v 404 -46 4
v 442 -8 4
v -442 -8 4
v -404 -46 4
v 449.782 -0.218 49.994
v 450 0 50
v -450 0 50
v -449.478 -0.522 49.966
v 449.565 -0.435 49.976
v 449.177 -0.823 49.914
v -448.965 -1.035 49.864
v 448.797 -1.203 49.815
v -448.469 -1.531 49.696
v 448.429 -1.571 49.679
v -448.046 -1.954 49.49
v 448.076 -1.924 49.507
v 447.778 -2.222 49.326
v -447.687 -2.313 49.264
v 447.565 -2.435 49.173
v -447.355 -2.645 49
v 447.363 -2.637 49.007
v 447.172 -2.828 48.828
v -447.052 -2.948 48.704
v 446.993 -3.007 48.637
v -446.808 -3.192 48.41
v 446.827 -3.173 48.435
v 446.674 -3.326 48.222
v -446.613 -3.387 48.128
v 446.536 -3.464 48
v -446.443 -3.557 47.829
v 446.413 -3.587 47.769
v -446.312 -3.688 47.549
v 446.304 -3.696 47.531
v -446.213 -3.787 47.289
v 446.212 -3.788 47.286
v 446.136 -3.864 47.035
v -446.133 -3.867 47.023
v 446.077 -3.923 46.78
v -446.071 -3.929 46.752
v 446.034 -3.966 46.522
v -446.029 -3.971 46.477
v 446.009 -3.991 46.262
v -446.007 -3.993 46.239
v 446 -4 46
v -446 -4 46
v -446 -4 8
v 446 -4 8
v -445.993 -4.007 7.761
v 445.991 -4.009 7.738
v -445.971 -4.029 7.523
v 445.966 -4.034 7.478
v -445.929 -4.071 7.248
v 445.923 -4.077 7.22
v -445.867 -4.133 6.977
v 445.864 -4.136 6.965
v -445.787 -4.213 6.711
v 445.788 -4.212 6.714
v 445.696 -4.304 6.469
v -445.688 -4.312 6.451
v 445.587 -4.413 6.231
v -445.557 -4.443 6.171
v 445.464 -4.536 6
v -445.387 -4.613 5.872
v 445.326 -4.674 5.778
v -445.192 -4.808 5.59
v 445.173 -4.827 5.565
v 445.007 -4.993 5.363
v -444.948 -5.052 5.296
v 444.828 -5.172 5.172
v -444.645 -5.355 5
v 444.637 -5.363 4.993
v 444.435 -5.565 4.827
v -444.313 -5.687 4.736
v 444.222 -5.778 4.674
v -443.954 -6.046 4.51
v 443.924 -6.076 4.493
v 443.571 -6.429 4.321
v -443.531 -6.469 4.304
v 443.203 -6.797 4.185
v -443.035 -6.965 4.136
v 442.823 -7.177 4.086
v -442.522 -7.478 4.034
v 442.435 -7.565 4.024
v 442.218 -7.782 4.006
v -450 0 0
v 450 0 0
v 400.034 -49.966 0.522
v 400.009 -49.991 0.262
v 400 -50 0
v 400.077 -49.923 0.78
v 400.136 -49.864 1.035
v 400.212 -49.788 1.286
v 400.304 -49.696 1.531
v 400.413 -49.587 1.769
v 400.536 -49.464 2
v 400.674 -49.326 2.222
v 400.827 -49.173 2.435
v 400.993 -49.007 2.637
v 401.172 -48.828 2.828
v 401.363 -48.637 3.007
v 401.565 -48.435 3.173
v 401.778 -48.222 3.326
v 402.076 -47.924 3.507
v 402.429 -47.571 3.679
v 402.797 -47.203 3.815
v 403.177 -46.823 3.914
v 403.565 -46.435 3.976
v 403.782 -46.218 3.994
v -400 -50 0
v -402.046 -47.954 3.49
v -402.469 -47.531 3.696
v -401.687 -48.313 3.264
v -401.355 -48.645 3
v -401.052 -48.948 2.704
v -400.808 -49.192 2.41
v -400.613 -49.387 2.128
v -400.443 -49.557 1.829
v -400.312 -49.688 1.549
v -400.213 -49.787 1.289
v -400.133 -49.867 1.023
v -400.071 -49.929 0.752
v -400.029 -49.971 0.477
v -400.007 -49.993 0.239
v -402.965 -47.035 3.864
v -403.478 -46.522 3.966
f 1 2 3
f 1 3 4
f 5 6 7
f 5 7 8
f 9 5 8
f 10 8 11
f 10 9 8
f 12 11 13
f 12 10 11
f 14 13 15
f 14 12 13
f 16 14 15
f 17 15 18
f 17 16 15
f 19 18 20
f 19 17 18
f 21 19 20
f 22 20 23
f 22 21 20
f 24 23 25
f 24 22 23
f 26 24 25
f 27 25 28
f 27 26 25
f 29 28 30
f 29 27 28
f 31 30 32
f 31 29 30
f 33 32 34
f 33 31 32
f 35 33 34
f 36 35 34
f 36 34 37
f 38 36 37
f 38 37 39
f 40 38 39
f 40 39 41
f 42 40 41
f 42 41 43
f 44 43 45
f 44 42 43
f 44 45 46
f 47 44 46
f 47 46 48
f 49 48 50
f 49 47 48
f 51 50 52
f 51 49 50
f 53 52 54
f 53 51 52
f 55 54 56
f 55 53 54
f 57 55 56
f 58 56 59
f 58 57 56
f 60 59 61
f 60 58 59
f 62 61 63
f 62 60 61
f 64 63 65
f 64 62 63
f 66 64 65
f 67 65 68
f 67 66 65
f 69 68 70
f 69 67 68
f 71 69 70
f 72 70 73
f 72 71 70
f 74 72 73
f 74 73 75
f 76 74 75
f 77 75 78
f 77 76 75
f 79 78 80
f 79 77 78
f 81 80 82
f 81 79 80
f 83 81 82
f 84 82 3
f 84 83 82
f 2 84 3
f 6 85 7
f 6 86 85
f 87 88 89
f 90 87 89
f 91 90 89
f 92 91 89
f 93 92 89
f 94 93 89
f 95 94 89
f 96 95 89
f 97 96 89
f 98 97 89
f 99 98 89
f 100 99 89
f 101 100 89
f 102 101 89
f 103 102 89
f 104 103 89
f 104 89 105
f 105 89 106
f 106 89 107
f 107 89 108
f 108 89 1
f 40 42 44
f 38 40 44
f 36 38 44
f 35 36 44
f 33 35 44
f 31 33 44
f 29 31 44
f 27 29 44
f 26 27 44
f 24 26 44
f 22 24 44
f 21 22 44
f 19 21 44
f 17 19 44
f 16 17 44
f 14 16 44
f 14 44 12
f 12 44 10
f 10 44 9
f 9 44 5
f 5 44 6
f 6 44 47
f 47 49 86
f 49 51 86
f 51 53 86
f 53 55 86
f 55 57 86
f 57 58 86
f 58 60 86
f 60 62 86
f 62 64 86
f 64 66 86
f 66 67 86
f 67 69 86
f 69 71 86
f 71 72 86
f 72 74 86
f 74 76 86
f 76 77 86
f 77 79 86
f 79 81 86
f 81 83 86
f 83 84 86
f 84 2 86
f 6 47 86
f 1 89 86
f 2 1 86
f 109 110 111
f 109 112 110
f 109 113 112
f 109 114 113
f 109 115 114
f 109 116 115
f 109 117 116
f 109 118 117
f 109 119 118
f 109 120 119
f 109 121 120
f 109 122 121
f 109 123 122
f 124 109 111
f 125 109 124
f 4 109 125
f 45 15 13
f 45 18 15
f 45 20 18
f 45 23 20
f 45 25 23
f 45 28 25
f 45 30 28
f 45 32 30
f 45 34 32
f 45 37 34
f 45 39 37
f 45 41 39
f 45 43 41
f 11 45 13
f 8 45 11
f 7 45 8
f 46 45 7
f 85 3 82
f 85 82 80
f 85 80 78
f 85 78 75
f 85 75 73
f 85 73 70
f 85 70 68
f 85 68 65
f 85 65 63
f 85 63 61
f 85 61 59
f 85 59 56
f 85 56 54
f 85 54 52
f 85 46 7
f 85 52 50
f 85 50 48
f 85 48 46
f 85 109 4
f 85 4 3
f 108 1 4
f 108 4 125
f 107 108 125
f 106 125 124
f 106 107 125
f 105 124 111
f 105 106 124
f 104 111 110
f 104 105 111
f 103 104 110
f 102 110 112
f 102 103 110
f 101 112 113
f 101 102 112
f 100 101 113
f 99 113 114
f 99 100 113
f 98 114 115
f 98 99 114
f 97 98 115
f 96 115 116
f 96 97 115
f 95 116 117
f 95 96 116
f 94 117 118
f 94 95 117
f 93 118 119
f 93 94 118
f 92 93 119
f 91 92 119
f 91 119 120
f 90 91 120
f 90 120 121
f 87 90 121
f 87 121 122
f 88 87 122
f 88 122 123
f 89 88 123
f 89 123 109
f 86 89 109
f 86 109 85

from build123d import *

# Parameters (mm, degrees)
F1_DEPTH = 450
F3_DEPTH = 50.001


# Not quite as in the source:
# - a pattern or mirror of a feature is missing from the dataset's text; its kind, count and spacing are read off the source's solid


with BuildPart() as f1:
    # F0 (on Right) → F1 (new body, symmetric)
    with BuildSketch(Plane.YZ):
        with BuildLine():
            Line((0, 0), (0, 50))
            ThreePointArc((0, 50), (-2.8284271247, 48.8284271247), (-4, 46))
            Line((-4, 46), (-4, 8))
            ThreePointArc((-4, 8), (-5.1715728753, 5.1715728753), (-8, 4))
            Line((-8, 4), (-46, 4))
            ThreePointArc((-46, 4), (-48.8284271247, 2.8284271247), (-50, 0))
            Line((-50, 0), (0, 0))
        make_face()
    extrude(amount=F1_DEPTH, both=True)

    # F2 (on face) → F3 (cut, through all)
    with BuildSketch(Plane(origin=(0, 0, 0), x_dir=(1, 0, 0), z_dir=(0, 0, -1))):
        Polygon((400, 50), (450, 0), (450, 50), align=None)
    f3 = extrude(amount=-F3_DEPTH, mode=Mode.SUBTRACT)

    # F3_copies: F3 across plane
    add(f3.mirror(Plane(origin=(0, 0, 0), x_dir=(0, 0, -1), z_dir=(-1, 0, 0))), mode=Mode.SUBTRACT)


solid = f1.part
